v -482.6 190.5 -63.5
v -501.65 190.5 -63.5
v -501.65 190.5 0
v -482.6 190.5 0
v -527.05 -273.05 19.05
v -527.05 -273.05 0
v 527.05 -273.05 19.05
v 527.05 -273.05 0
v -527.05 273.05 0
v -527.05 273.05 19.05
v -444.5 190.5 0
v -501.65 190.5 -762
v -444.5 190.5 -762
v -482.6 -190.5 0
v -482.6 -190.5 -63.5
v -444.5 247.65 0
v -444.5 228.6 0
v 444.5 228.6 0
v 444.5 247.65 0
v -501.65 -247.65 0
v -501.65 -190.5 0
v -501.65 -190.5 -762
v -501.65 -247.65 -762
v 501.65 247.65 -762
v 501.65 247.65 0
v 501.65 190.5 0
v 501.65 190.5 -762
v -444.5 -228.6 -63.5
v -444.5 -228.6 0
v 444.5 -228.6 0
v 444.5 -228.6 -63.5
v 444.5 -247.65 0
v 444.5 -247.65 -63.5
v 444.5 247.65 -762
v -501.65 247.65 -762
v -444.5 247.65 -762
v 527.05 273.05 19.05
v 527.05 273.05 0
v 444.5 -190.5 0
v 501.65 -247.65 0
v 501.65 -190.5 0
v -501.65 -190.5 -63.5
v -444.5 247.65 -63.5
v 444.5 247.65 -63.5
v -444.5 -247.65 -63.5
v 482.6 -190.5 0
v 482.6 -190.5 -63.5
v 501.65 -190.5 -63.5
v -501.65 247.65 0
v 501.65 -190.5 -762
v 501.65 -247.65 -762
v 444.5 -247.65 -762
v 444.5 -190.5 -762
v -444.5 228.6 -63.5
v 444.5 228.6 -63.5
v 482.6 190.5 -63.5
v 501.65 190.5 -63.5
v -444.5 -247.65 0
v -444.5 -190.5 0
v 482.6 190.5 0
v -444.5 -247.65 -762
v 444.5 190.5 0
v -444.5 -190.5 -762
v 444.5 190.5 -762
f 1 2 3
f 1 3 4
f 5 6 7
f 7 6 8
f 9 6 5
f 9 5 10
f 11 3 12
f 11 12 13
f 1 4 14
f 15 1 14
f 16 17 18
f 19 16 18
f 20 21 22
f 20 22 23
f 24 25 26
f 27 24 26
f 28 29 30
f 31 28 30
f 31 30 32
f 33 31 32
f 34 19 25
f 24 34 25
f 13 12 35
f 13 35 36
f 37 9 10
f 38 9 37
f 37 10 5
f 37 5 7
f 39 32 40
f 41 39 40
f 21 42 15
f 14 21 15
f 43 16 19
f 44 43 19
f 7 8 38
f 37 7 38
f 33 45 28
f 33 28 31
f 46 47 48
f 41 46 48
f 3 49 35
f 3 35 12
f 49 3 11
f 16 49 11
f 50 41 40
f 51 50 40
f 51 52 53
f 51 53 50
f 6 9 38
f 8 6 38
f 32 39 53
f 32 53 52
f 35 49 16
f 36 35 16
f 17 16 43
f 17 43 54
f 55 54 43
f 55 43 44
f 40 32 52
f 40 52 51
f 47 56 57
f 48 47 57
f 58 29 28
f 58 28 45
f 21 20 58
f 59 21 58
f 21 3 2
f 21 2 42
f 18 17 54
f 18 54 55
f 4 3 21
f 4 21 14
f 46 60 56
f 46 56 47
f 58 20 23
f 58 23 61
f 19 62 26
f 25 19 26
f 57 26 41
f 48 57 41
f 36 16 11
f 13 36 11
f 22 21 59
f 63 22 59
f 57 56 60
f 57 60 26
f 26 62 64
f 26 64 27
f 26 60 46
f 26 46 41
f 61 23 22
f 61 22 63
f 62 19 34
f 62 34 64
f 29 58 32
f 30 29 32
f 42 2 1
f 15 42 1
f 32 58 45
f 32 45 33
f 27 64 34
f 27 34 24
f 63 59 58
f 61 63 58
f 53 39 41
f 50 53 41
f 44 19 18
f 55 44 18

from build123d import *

# Parameters (mm, degrees)
F0_W     = 1054.1
F0_H     = 546.1
F1_DEPTH = 19.05
F2_W     = 57.15
F2_H     = 57.15
F3_DEPTH = 762
F4_W     = 889
F4_H     = 19.05
F4_W_2   = 19.05
F4_H_2   = 381
F5_DEPTH = 63.5


with BuildPart() as f1:
    # F0 (on Top) → F1 (new body)
    with BuildSketch(Plane.XY):
        Rectangle(F0_W, F0_H)
    extrude(amount=F1_DEPTH)


with BuildPart() as f3:
    # F2 (on face) → F3 (new body)
    with BuildSketch(Plane(origin=(0, 0, 0), x_dir=(1, 0, 0), z_dir=(0, 0, -1))):
        with Locations((-473.075, 219.075)):
            Rectangle(F2_W, F2_H)
        with Locations((473.075, 219.075)):
            Rectangle(F2_W, F2_H)
        with Locations((473.075, -219.075)):
            Rectangle(F2_W, F2_H)
        with Locations((-473.075, -219.075)):
            Rectangle(F2_W, F2_H)
    extrude(amount=F3_DEPTH)


with BuildPart() as f5:
    # F4 (on face) → F5 (new body)
    with BuildSketch(Plane(origin=(0, 0, 0), x_dir=(1, 0, 0), z_dir=(0, 0, -1))):
        with Locations((0, 238.125)):
            Rectangle(F4_W, F4_H)
        with Locations((-492.125, 0)):
            Rectangle(F4_W_2, F4_H_2)
        with Locations((0, -238.125)):
            Rectangle(F4_W, F4_H)
        with Locations((492.125, 0)):
            Rectangle(F4_W_2, F4_H_2)
    extrude(amount=F5_DEPTH)


solid = Compound([f1.part, f3.part, f5.part])
